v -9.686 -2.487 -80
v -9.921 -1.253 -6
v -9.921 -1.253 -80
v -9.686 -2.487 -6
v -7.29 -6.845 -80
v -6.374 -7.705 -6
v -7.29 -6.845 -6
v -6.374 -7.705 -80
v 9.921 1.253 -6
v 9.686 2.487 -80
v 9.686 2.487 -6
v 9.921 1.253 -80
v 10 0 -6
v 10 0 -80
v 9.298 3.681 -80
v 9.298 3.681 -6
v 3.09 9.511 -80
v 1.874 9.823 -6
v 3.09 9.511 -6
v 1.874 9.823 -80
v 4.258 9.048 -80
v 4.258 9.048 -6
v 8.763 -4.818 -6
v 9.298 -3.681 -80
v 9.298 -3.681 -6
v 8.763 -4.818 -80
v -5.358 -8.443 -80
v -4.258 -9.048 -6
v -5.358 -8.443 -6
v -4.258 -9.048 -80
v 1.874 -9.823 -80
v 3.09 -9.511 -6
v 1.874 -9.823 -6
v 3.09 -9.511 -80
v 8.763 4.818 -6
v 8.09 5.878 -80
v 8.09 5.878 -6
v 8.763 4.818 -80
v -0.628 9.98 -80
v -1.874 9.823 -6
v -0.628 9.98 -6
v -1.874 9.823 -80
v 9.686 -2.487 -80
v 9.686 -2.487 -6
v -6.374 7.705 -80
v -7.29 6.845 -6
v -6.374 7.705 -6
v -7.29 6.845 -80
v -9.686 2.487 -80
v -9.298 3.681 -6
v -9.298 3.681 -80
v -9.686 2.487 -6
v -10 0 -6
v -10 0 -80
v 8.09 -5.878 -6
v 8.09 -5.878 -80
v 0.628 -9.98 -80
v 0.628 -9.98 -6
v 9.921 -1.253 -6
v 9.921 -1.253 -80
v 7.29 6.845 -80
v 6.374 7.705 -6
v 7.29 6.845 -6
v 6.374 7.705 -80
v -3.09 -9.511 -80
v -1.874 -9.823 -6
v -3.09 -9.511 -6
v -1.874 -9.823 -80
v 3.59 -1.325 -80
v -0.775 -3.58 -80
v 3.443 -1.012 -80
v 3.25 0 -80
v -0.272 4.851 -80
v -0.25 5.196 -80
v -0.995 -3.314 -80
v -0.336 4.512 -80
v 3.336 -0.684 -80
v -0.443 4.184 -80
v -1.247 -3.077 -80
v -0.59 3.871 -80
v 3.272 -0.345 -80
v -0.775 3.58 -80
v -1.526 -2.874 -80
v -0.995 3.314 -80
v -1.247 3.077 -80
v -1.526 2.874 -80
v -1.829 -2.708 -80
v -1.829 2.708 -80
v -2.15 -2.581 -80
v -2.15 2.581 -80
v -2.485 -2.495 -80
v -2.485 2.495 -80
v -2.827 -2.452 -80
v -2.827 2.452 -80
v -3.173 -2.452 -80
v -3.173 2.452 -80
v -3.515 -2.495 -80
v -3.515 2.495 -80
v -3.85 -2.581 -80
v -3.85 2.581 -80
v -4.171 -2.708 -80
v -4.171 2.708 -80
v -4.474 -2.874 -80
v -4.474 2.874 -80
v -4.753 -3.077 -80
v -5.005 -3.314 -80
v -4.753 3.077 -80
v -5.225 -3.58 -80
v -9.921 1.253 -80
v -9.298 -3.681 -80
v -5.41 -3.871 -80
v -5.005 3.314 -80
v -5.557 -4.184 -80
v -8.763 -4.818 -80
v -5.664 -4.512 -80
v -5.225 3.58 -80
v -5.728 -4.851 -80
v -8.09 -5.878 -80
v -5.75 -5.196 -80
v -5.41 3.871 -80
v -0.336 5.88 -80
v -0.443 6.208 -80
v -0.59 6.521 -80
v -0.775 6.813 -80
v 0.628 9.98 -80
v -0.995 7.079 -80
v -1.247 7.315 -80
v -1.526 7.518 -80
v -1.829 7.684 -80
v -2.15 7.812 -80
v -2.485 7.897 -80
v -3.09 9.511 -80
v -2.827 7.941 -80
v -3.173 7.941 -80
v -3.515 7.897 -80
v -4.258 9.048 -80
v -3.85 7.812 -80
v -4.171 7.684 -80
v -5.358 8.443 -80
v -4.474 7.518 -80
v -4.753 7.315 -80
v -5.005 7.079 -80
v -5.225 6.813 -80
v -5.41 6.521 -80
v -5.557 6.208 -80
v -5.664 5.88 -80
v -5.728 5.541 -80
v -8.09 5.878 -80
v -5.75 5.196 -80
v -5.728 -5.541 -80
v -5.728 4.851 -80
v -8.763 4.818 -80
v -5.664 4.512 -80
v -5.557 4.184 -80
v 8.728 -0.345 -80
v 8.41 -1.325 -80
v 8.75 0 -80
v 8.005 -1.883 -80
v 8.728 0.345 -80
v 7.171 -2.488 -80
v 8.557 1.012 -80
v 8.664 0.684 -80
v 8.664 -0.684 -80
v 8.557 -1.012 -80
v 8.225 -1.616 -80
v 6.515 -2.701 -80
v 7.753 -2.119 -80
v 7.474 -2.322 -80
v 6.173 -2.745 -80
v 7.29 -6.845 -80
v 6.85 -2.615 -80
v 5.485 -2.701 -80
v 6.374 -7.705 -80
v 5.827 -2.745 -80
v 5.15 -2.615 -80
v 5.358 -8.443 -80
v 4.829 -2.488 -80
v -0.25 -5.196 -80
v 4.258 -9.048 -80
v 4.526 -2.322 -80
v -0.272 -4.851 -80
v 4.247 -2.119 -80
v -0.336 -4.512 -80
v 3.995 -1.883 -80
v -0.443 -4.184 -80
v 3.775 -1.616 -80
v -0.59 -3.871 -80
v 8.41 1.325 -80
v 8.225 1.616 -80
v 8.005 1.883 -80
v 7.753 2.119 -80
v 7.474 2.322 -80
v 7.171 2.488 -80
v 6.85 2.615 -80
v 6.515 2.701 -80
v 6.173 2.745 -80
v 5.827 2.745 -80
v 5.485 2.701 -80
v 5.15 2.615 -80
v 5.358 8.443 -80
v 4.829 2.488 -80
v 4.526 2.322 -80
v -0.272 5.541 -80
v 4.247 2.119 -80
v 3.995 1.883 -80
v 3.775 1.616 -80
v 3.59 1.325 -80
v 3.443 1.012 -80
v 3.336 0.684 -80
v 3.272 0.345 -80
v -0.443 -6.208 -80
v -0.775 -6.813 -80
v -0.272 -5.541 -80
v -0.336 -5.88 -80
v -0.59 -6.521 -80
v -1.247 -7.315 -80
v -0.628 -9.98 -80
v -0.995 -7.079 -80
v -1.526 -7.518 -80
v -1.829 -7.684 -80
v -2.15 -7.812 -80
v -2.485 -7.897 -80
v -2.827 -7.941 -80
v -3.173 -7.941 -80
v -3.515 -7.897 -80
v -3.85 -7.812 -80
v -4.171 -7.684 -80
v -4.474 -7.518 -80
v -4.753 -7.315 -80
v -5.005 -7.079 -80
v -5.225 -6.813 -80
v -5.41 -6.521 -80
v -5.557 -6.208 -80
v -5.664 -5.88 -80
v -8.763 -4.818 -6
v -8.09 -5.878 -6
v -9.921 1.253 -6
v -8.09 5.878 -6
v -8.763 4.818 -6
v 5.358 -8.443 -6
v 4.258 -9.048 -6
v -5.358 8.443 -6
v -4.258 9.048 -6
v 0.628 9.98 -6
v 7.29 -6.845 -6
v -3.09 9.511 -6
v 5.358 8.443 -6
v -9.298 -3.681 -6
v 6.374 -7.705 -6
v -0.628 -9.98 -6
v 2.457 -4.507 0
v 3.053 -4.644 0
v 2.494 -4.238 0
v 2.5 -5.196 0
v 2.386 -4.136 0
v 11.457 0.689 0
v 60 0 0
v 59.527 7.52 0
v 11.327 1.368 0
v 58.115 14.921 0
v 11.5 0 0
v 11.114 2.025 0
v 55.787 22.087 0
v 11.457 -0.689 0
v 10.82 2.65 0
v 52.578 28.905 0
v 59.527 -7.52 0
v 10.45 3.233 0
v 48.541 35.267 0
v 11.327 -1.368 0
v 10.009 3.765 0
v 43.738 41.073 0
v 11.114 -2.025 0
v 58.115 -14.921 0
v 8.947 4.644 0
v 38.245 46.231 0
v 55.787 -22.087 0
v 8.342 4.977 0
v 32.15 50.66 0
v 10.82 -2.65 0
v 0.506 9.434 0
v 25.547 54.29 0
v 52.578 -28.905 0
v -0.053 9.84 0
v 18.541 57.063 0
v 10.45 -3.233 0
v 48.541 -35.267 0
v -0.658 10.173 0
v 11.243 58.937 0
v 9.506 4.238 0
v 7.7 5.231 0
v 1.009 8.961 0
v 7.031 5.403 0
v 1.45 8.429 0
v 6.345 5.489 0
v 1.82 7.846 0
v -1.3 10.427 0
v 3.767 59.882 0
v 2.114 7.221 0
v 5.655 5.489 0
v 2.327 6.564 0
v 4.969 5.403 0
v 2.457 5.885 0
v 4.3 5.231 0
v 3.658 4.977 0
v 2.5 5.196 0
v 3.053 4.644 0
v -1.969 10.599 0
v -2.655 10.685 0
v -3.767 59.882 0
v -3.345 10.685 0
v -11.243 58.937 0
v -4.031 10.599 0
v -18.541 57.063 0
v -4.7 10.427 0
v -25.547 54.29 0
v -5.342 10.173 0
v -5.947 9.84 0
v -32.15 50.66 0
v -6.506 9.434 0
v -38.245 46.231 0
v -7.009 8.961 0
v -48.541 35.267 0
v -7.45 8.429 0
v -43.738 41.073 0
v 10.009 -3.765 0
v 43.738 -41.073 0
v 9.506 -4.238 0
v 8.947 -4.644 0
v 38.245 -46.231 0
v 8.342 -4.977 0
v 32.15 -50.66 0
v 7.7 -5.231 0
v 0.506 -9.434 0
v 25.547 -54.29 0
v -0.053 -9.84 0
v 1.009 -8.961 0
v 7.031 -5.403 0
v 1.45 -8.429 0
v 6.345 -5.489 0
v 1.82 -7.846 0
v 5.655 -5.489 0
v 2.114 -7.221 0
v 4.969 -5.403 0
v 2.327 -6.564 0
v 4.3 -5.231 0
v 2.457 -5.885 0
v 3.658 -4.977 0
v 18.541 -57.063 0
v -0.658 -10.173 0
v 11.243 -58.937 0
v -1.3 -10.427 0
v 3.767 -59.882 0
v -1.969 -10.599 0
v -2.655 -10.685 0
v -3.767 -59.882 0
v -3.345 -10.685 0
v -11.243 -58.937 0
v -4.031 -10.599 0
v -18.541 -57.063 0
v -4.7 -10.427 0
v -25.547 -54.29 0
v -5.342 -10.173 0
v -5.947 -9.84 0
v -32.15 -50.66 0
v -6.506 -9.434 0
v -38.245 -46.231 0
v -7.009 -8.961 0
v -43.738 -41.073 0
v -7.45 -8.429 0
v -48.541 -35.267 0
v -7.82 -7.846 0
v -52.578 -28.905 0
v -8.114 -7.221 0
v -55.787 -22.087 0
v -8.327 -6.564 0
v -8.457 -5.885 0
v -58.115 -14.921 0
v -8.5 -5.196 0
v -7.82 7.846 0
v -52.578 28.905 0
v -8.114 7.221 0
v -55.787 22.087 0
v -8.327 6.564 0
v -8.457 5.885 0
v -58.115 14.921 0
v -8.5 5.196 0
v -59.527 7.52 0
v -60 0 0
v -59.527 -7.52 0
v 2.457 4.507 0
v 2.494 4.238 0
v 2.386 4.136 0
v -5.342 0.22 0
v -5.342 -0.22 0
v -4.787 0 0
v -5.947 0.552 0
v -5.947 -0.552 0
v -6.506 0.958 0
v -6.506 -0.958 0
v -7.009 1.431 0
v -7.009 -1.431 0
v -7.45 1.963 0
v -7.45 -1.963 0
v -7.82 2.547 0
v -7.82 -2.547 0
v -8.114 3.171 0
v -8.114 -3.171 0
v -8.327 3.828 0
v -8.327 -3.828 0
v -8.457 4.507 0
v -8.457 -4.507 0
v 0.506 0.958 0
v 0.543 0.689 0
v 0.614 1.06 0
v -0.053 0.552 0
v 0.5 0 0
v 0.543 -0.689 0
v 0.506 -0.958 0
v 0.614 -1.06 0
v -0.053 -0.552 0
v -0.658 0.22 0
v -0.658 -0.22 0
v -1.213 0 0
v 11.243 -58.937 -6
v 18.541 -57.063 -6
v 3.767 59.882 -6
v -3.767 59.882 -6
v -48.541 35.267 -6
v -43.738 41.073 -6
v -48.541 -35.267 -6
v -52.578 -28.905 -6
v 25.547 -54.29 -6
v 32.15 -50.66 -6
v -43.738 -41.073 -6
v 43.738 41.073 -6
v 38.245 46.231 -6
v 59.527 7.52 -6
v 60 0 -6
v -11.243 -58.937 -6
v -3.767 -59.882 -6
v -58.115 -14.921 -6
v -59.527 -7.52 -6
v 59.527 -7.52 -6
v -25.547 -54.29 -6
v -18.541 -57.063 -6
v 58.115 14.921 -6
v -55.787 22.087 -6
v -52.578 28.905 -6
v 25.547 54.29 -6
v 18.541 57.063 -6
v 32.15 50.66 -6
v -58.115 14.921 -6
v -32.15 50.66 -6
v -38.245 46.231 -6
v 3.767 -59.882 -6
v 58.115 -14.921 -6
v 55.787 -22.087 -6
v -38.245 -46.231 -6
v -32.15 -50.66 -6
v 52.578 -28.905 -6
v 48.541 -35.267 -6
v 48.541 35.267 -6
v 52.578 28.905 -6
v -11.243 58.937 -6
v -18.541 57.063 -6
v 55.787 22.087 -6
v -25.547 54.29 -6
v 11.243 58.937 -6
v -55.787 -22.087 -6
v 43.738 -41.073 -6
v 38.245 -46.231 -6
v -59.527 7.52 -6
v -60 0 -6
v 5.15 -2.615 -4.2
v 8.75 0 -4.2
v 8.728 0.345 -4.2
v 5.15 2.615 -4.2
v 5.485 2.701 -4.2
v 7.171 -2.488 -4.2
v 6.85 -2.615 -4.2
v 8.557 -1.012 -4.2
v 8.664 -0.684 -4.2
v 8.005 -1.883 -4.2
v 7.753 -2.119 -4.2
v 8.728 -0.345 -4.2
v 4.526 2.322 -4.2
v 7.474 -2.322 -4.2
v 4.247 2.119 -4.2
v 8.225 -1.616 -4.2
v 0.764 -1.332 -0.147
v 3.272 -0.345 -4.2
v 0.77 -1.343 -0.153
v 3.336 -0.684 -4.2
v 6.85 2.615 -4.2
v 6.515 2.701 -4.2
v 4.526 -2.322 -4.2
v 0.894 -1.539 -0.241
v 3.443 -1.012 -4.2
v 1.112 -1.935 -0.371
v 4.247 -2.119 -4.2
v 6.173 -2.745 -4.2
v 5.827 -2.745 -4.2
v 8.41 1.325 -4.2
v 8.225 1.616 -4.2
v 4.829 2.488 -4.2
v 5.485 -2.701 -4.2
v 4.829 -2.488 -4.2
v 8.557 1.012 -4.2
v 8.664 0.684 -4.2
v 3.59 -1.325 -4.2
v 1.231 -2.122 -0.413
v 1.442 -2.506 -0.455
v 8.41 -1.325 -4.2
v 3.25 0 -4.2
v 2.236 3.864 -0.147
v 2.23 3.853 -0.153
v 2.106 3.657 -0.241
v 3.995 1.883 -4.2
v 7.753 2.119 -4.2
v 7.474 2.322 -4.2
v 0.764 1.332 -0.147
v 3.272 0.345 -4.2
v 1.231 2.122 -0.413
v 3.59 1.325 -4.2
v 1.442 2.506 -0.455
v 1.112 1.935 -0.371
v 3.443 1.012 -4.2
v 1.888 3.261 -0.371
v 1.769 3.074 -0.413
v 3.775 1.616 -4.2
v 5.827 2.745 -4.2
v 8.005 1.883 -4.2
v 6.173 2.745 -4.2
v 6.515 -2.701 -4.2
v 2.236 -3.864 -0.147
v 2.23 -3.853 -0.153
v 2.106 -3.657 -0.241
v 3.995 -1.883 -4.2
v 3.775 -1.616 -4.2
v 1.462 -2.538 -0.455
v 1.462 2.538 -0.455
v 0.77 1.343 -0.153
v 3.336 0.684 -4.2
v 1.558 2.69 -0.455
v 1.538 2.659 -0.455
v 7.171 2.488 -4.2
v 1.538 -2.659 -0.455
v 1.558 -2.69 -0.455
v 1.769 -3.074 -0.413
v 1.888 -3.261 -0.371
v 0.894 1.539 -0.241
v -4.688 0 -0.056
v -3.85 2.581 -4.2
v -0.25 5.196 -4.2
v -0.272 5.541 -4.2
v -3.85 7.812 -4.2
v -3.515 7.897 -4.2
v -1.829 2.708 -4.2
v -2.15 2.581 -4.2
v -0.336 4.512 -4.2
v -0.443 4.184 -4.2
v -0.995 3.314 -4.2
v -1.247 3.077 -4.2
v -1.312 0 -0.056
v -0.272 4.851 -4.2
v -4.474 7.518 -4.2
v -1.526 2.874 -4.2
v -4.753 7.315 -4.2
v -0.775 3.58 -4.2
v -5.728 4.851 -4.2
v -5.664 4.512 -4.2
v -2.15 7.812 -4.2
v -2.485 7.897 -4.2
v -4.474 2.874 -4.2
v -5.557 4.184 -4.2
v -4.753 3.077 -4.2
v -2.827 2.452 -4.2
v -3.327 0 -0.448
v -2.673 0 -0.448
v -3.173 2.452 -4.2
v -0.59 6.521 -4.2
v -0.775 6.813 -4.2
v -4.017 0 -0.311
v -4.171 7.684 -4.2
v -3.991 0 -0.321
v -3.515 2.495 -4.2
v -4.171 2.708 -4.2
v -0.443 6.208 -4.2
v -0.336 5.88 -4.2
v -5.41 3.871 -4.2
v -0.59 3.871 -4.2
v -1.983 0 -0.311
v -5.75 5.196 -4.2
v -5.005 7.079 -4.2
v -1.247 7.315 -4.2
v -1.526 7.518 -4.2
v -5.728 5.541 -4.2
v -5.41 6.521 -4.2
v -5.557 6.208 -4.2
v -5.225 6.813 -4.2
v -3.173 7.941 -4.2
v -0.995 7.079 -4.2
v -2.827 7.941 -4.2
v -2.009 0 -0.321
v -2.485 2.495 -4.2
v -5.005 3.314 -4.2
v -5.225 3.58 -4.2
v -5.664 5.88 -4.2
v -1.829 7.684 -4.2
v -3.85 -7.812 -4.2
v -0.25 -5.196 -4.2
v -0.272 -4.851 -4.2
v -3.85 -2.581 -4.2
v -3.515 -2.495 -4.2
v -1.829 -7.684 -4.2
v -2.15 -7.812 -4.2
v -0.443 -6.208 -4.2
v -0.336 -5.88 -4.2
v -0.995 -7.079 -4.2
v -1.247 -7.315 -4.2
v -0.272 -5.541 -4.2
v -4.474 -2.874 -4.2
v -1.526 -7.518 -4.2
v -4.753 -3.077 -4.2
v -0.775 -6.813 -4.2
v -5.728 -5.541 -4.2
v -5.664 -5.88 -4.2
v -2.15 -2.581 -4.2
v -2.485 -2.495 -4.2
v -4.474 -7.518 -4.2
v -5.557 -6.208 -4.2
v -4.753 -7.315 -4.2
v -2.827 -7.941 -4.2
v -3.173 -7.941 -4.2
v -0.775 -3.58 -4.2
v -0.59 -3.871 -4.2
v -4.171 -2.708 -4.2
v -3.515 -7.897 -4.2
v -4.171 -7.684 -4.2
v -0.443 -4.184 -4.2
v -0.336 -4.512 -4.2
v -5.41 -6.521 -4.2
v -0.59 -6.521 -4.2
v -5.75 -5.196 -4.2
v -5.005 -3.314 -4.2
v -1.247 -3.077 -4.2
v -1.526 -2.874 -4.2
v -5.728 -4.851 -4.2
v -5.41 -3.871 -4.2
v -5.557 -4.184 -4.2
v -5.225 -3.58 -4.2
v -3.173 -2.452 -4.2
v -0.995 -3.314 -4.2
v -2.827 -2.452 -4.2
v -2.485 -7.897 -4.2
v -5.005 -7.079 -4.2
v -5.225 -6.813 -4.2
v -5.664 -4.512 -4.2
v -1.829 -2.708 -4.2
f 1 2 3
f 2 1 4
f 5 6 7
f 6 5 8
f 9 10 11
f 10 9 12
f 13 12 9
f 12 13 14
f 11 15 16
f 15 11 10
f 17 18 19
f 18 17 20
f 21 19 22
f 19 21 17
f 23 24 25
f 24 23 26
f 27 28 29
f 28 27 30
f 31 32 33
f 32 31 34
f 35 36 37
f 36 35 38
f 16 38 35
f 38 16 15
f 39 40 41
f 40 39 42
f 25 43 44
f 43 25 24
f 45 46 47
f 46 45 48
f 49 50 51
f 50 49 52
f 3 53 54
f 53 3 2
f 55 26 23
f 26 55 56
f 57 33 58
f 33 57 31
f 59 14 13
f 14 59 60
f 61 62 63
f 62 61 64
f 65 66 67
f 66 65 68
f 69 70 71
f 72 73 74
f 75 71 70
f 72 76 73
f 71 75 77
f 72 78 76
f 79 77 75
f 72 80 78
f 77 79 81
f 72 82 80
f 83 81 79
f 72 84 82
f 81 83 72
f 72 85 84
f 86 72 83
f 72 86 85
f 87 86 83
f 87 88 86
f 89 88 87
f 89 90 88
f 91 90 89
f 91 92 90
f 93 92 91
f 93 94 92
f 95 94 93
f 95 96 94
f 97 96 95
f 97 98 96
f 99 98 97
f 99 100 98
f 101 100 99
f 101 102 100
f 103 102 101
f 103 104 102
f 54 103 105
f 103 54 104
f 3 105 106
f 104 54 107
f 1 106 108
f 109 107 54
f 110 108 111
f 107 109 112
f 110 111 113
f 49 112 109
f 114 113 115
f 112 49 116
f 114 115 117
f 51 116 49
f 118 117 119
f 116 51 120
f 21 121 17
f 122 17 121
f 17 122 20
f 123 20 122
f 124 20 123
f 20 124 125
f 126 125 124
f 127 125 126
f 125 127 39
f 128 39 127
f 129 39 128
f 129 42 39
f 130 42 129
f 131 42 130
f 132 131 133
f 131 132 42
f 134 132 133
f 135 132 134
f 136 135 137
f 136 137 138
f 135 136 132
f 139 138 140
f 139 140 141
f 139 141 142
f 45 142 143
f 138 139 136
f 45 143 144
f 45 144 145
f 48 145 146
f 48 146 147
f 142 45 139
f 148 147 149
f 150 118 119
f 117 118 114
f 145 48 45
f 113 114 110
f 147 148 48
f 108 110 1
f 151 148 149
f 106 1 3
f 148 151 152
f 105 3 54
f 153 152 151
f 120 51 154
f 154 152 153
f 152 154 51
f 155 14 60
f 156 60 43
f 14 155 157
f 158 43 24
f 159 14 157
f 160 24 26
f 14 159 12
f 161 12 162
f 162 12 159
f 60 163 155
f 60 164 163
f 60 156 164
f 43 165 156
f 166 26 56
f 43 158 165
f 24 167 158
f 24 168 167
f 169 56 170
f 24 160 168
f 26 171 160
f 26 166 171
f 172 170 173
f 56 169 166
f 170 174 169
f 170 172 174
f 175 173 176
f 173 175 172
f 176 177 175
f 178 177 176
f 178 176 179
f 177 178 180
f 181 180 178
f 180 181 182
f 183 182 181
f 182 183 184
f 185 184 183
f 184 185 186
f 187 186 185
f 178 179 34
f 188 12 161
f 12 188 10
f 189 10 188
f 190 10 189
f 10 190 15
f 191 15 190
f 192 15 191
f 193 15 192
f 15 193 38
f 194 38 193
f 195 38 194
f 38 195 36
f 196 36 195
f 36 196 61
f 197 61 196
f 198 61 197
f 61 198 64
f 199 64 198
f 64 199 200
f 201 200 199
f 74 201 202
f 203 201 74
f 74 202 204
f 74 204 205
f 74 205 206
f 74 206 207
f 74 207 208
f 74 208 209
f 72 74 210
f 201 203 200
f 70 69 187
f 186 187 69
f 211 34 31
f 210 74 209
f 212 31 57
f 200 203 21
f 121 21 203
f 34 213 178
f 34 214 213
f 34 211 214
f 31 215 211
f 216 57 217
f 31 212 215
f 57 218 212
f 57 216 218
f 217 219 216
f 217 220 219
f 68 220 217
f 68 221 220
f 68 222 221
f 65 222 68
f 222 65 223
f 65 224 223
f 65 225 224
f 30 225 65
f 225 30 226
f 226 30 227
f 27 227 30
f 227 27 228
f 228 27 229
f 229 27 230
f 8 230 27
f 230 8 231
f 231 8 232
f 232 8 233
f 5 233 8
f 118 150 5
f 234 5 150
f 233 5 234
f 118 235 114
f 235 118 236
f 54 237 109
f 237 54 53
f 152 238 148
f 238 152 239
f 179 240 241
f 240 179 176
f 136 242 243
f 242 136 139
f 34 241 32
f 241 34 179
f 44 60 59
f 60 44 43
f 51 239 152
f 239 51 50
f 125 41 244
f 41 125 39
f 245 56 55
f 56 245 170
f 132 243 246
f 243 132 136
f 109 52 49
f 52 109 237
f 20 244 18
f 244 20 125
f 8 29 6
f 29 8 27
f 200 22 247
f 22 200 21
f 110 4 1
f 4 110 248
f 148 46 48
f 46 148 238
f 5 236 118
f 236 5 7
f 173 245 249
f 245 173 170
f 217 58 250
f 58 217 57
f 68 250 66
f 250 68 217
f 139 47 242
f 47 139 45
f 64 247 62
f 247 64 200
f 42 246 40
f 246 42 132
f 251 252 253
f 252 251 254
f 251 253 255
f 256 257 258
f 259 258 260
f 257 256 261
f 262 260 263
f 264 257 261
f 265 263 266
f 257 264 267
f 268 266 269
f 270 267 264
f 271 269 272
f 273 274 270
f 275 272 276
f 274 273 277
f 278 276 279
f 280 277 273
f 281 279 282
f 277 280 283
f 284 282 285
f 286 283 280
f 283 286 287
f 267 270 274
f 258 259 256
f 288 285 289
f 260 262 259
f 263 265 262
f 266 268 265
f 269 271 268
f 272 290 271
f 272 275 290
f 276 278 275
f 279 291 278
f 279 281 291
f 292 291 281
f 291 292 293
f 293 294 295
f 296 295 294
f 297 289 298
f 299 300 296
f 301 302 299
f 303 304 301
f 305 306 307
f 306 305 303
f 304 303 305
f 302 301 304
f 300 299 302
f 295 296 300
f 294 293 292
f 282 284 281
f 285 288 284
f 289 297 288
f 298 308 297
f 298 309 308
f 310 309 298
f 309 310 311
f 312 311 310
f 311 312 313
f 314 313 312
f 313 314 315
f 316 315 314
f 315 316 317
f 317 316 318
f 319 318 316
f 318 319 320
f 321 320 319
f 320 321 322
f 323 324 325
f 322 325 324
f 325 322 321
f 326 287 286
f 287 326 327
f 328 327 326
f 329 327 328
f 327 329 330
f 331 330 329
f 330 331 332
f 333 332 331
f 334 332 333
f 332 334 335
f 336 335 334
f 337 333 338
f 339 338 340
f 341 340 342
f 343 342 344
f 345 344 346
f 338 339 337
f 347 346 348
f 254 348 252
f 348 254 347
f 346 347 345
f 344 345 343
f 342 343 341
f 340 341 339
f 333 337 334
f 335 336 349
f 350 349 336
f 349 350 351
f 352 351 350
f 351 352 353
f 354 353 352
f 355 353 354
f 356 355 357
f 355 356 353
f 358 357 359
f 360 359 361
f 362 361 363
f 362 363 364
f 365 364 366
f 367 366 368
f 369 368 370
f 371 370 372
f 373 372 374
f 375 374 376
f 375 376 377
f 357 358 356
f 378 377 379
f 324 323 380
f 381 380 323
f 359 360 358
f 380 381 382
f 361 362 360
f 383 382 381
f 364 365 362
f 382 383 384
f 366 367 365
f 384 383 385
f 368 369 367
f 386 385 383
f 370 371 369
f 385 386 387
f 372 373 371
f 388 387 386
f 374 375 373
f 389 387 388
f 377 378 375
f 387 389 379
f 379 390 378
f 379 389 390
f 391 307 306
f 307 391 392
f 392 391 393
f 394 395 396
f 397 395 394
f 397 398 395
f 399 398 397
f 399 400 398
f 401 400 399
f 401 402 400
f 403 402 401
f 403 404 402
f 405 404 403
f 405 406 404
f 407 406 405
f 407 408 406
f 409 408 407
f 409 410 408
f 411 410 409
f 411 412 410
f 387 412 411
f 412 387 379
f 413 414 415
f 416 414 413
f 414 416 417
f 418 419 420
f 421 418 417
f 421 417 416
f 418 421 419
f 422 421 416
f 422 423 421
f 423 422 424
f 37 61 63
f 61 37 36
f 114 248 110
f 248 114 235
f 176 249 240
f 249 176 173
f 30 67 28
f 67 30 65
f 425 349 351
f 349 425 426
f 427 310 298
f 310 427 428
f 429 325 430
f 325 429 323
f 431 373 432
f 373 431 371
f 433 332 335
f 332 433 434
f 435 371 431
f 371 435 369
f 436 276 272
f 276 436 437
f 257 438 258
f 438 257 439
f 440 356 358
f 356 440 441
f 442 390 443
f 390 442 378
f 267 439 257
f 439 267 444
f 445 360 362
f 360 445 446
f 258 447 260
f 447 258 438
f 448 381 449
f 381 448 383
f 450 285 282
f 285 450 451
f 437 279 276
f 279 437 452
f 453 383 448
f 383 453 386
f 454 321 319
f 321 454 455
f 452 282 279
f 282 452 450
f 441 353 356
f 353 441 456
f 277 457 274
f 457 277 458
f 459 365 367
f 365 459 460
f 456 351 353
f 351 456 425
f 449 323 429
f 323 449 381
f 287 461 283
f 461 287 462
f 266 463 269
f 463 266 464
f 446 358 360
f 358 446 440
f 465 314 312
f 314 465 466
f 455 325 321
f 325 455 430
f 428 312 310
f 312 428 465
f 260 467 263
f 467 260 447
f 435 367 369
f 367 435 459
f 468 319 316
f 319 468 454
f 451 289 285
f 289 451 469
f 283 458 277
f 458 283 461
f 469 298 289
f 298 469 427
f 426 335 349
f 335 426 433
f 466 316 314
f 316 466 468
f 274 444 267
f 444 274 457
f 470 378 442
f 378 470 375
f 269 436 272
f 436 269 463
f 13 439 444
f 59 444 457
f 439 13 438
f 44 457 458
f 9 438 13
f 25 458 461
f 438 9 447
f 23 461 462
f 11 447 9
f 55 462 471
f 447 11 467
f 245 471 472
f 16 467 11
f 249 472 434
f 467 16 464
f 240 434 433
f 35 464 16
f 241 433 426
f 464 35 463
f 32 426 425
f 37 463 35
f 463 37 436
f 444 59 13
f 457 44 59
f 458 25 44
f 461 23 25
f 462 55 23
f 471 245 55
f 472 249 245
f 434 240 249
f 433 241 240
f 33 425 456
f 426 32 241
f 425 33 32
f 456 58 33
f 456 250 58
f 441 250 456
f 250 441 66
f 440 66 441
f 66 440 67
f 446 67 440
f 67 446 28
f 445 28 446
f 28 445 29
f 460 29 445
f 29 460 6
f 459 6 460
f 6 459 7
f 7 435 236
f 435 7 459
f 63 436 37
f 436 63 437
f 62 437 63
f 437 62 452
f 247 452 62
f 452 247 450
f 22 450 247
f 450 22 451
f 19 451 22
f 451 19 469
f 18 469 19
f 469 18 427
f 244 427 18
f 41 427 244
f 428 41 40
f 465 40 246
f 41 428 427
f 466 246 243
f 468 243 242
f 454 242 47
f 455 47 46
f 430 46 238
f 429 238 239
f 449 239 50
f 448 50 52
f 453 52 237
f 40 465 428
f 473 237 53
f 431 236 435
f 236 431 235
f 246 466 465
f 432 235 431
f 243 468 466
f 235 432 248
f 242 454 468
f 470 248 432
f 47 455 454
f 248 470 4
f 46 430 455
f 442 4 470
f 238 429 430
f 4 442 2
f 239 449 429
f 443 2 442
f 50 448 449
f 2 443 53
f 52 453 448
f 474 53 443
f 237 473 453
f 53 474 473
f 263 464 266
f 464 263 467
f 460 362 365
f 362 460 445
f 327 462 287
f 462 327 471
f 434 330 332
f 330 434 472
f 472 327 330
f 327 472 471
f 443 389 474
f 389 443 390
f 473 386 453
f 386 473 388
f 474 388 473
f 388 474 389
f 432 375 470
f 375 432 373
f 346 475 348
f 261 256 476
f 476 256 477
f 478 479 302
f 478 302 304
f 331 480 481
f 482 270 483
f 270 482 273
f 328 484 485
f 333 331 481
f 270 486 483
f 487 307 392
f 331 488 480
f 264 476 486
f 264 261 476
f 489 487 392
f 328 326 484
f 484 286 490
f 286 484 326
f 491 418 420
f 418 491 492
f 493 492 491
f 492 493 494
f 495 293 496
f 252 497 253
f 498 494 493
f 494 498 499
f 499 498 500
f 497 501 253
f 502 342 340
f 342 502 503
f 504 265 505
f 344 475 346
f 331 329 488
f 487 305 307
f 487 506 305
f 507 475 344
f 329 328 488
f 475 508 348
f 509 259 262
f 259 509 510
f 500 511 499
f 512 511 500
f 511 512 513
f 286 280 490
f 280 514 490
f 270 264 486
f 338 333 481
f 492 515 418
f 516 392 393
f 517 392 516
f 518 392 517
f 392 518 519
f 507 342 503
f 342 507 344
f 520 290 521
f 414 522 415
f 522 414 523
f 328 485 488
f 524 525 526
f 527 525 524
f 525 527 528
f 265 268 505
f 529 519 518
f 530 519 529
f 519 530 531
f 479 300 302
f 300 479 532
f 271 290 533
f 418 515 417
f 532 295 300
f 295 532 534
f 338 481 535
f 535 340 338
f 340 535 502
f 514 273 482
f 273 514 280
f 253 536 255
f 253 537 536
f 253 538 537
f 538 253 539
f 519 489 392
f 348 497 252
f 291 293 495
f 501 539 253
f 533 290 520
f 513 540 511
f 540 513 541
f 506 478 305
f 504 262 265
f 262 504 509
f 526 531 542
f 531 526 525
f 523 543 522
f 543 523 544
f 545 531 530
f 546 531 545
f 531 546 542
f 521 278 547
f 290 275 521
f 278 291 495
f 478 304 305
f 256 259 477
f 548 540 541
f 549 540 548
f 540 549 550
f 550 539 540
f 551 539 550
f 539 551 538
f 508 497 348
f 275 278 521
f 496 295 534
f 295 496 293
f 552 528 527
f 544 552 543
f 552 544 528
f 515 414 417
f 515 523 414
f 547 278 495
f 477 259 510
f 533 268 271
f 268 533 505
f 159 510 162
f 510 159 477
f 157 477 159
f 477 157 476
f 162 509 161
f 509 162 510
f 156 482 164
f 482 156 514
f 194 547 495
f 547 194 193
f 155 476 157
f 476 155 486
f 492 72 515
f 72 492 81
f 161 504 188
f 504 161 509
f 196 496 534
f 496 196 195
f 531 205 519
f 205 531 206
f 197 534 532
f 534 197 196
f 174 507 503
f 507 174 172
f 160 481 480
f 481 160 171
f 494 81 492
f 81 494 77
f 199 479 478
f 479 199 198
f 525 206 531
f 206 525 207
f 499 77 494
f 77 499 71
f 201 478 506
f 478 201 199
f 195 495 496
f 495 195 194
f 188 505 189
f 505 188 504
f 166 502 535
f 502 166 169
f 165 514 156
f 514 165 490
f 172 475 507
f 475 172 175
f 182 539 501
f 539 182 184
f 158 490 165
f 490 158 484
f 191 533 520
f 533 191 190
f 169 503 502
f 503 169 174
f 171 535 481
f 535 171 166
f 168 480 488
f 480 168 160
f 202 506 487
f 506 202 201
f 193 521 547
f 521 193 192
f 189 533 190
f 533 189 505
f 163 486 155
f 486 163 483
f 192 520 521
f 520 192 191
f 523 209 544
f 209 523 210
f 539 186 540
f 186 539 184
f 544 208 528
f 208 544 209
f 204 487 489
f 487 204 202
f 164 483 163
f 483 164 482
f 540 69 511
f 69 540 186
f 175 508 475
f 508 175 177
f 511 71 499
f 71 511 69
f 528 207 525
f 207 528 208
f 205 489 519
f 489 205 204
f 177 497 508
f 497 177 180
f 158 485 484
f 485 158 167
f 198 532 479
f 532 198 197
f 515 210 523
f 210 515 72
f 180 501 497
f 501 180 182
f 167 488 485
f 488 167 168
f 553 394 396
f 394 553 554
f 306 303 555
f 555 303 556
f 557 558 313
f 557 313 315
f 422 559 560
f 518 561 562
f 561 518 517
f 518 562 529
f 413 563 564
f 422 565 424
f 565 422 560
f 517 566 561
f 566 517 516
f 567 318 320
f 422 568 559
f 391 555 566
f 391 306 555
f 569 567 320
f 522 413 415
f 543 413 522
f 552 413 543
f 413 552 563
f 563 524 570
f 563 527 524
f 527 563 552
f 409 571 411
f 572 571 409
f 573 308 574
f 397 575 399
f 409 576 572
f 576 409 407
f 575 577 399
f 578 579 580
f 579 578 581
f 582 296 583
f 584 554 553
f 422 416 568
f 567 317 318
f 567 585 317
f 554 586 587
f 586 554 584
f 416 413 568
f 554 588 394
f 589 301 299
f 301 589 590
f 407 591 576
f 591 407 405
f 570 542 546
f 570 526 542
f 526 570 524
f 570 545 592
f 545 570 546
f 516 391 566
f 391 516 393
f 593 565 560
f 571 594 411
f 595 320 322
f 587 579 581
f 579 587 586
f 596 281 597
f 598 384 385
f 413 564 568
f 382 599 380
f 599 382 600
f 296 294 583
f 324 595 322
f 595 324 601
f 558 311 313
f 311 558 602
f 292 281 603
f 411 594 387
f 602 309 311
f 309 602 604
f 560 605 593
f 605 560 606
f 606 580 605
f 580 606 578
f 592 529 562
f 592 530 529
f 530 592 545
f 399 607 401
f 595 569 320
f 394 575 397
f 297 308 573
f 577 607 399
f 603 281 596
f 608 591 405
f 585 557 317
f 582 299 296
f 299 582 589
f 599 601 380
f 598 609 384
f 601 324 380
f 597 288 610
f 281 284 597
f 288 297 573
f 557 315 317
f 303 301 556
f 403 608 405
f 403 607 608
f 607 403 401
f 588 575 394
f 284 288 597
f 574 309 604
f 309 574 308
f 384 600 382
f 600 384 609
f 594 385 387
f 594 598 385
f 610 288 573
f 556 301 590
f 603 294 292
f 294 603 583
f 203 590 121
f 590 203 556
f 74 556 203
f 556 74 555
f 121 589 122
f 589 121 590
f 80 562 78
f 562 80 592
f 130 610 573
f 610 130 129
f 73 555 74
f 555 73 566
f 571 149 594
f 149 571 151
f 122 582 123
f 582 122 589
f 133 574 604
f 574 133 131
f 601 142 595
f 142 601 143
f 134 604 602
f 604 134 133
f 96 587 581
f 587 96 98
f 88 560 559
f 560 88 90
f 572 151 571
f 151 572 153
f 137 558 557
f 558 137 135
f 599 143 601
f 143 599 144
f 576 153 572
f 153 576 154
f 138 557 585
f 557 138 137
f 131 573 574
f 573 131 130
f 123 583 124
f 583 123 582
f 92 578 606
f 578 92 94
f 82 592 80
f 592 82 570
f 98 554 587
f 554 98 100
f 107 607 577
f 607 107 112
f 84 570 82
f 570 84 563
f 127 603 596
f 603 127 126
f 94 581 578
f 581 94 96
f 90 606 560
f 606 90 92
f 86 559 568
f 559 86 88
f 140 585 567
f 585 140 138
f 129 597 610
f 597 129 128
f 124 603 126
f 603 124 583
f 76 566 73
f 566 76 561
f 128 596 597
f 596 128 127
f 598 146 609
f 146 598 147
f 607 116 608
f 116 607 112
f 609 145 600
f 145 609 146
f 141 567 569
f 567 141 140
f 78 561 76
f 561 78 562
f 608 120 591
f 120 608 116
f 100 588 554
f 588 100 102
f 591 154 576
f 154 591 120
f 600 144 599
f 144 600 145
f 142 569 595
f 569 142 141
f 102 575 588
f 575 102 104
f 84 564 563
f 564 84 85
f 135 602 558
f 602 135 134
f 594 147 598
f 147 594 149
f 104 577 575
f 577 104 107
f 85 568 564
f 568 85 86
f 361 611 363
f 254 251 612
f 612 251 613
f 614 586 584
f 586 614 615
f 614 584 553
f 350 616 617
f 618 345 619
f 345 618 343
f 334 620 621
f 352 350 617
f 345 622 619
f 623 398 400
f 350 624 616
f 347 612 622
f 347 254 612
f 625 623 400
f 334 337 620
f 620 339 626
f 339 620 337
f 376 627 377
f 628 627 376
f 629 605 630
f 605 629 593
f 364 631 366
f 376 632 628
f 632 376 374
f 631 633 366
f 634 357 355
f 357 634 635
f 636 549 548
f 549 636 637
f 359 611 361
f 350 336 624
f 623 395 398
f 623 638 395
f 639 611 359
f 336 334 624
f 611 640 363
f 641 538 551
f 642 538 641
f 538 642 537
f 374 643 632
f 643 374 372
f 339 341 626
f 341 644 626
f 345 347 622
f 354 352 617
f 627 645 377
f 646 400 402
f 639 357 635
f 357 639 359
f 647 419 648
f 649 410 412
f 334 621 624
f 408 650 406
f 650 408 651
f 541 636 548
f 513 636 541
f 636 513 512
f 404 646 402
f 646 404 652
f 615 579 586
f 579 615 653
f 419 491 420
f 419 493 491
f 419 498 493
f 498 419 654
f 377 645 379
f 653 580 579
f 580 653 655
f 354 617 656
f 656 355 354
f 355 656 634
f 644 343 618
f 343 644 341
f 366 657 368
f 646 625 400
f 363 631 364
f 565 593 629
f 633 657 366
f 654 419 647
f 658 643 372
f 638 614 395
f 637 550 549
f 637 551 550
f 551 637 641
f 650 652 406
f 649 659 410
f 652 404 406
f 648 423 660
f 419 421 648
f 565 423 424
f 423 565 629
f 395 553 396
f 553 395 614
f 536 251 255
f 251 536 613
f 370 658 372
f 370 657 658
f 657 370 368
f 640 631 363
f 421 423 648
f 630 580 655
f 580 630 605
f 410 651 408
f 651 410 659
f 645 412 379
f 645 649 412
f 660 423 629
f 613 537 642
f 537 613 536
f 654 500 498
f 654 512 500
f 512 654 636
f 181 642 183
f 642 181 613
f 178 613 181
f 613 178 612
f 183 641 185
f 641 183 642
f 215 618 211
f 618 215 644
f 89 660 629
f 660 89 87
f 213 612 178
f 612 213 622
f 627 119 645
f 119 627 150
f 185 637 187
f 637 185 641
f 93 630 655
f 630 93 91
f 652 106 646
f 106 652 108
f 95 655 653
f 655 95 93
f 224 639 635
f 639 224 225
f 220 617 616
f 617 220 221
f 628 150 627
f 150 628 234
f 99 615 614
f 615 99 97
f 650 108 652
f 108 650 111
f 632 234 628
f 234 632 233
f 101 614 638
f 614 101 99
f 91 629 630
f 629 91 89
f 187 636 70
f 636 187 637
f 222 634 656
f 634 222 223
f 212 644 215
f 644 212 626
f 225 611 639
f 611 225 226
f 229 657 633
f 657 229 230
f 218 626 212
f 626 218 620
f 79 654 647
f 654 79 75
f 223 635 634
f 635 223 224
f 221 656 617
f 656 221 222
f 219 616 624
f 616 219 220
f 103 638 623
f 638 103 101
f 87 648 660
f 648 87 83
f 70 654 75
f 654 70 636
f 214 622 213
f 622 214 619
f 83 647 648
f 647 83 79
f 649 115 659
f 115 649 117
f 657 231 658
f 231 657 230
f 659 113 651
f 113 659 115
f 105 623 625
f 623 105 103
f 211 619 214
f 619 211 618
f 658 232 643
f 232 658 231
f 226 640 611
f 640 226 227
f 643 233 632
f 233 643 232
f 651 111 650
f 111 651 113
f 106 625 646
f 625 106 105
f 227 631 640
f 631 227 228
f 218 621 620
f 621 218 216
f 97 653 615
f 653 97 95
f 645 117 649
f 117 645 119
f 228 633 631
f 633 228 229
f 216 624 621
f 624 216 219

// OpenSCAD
$fn = 50;


difference() {
	union() {
		translate(v = [0, 0, -80.0000000000]) {
			cylinder(h = 80, r = 10.0000000000);
		}
		translate(v = [0, 0, -6.0000000000]) {
			cylinder(h = 6, r = 60.0000000000);
		}
	}
	union() {
		translate(v = [6.0000000000, 0.0000000000, 0]) {
			rotate(a = [0, 0, 0]) {
				difference() {
					union() {
						#translate(v = [0, 0, -80.0000000000]) {
							cylinder(h = 80, r = 2.2500000000);
						}
						#translate(v = [0, 0, -4.2000000000]) {
							cylinder(h = 4.2000000000, r = 10.0000000000, r1 = 2.7500000000, r2 = 5.5000000000);
						}
						#translate(v = [0, 0, -80.0000000000]) {
							cylinder(h = 80, r = 2.7500000000);
						}
						#translate(v = [0, 0, -80.0000000000]) {
							cylinder(h = 80, r = 2.2500000000);
						}
					}
					union();
				}
			}
		}
		translate(v = [-3.0000000000, 5.1961524227, 0]) {
			rotate(a = [0, 0, 0]) {
				difference() {
					union() {
						#translate(v = [0, 0, -80.0000000000]) {
							cylinder(h = 80, r = 2.2500000000);
						}
						#translate(v = [0, 0, -4.2000000000]) {
							cylinder(h = 4.2000000000, r = 10.0000000000, r1 = 2.7500000000, r2 = 5.5000000000);
						}
						#translate(v = [0, 0, -80.0000000000]) {
							cylinder(h = 80, r = 2.7500000000);
						}
						#translate(v = [0, 0, -80.0000000000]) {
							cylinder(h = 80, r = 2.2500000000);
						}
					}
					union();
				}
			}
		}
		translate(v = [-3.0000000000, -5.1961524227, 0]) {
			rotate(a = [0, 0, 0]) {
				difference() {
					union() {
						#translate(v = [0, 0, -80.0000000000]) {
							cylinder(h = 80, r = 2.2500000000);
						}
						#translate(v = [0, 0, -4.2000000000]) {
							cylinder(h = 4.2000000000, r = 10.0000000000, r1 = 2.7500000000, r2 = 5.5000000000);
						}
						#translate(v = [0, 0, -80.0000000000]) {
							cylinder(h = 80, r = 2.7500000000);
						}
						#translate(v = [0, 0, -80.0000000000]) {
							cylinder(h = 80, r = 2.2500000000);
						}
					}
					union();
				}
			}
		}
	}
}
